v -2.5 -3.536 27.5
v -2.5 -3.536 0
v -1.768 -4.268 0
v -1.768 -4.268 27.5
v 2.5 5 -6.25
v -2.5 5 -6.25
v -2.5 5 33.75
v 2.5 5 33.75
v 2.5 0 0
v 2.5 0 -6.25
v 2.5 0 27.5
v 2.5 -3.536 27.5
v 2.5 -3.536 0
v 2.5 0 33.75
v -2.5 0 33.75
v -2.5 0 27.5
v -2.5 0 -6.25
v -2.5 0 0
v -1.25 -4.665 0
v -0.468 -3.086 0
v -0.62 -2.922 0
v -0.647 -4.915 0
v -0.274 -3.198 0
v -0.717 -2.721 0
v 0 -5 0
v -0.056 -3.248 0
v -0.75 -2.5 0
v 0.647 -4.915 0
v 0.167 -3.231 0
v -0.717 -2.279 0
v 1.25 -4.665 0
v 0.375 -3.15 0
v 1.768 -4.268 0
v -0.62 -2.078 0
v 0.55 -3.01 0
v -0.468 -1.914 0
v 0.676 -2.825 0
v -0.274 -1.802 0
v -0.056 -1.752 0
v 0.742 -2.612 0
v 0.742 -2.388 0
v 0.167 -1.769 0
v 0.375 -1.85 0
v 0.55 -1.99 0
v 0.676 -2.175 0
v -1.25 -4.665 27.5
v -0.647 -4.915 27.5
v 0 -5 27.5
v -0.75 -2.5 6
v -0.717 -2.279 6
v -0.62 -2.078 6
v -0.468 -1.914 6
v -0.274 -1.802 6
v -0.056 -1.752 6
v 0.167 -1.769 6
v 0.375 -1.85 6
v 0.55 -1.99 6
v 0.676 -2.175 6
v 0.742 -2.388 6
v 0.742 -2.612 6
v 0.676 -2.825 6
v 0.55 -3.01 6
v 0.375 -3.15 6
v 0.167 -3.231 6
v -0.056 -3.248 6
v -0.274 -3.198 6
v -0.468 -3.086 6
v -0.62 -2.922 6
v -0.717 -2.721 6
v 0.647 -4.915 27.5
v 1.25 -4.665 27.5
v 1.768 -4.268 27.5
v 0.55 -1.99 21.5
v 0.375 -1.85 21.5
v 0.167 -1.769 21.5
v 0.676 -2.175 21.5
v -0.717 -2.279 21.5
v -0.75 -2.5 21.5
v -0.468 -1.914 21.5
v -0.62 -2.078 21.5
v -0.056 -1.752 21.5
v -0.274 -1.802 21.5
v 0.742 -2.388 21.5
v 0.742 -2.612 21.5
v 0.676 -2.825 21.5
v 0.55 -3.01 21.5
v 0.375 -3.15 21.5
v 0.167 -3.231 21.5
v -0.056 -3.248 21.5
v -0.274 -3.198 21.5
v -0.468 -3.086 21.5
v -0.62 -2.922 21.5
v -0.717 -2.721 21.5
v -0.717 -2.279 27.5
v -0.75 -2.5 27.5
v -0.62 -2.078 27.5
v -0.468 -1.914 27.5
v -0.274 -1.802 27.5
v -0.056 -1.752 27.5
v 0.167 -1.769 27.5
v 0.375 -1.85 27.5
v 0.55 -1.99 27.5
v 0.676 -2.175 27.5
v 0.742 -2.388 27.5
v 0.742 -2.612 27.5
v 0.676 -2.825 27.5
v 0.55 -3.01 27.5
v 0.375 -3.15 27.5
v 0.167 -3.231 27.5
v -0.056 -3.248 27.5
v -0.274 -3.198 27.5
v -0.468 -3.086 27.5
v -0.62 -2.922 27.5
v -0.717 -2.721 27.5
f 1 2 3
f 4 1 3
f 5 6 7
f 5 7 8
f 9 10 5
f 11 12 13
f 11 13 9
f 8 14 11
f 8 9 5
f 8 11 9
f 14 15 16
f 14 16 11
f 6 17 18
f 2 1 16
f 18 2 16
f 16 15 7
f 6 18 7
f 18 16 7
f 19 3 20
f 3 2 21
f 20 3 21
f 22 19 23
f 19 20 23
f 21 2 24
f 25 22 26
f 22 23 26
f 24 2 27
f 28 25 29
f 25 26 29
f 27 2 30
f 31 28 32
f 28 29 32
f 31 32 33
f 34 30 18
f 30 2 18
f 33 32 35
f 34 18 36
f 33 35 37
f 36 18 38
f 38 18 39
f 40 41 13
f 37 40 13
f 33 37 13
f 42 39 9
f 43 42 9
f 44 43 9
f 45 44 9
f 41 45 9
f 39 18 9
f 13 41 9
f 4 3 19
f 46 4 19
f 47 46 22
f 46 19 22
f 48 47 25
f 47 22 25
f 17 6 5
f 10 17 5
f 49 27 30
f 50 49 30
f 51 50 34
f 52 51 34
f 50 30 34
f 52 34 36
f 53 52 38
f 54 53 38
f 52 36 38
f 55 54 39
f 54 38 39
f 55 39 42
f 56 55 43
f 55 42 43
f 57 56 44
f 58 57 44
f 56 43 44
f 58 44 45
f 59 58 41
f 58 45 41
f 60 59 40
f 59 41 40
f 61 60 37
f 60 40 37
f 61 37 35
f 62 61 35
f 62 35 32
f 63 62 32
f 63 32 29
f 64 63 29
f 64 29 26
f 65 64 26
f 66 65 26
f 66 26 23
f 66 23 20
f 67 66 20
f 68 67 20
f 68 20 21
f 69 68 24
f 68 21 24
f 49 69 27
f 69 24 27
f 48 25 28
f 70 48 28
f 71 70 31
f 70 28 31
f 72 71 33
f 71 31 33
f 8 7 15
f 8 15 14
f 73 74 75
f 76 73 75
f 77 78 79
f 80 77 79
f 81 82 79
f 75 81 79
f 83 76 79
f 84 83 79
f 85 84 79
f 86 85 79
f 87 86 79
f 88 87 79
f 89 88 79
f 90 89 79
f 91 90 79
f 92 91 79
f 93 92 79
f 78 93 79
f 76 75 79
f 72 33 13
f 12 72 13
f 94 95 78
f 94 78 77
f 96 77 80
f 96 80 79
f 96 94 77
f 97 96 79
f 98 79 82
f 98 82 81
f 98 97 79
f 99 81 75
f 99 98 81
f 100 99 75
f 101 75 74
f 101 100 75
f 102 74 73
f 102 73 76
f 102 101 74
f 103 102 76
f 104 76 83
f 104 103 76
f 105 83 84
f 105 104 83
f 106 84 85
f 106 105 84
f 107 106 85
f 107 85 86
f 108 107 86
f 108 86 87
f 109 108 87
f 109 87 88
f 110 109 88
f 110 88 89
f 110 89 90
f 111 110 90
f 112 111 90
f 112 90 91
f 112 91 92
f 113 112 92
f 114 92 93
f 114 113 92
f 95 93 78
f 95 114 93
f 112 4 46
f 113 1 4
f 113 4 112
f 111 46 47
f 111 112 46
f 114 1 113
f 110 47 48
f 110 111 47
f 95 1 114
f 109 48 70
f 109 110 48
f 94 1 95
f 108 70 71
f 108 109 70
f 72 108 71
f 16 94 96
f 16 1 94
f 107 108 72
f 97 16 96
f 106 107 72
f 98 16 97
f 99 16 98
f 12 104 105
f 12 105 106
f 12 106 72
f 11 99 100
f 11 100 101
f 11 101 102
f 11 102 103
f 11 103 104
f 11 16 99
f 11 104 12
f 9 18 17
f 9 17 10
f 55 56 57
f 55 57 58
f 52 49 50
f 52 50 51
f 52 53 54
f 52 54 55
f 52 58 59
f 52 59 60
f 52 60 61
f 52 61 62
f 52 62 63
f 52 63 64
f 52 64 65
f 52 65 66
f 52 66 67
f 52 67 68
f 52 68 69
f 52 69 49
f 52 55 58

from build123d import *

# Parameters (mm, degrees)
SKETCH_1_W          = 5
SKETCH_1_H          = 10
EXTRUDE_1_DEPTH     = 27.5
SKETCH_2_W          = 5
SKETCH_2_H          = 5
EXTRUDE_2_DEPTH     = 20
SKETCH_3_R          = 0.75
CUT_EXTRUDE_1_DEPTH = 6
CUT_EXTRUDE_2_DEPTH = 27.5


with BuildPart() as part:
    # 草图1 → 凸台-拉伸1 (new body)
    with BuildSketch(Plane.XY):
        Rectangle(SKETCH_1_W, SKETCH_1_H)
    extrude(amount=EXTRUDE_1_DEPTH)

    # 草图2 → 凸台-拉伸2 (add, symmetric)
    with BuildSketch(Plane.XY.offset(13.75)):
        with Locations((0, 2.5)):
            Rectangle(SKETCH_2_W, SKETCH_2_H)
    extrude(amount=EXTRUDE_2_DEPTH, both=True)

    # 草图3 → 切除-拉伸1 (cut)
    with BuildSketch(Plane(origin=(0, 0, 0), x_dir=(-1, 0, 0), z_dir=(0, 0, -1))):
        with Locations((0, -2.5)):
            Circle(SKETCH_3_R)
    cut_extrude_1 = extrude(amount=-CUT_EXTRUDE_1_DEPTH, mode=Mode.SUBTRACT)

    # 镜向1: 切除-拉伸1 across plane
    add(cut_extrude_1.mirror(Plane.XY.offset(13.75)), mode=Mode.SUBTRACT)

    # 草图4 → 切除-拉伸2 (cut)
    with BuildSketch(Plane(origin=(0, 0, 0), x_dir=(-1, 0, 0), z_dir=(0, 0, -1))):
        with BuildLine():
            ThreePointArc((0, -5), (-0.956708581, -4.809698831), (-1.767766953, -4.267766953))
            Line((-1.767766953, -4.267766953), (-2.5, -3.535533906))
            Line((-2.5, -3.535533906), (-2.5, -5))
            Line((-2.5, -5), (0, -5))
        make_face()
        with BuildLine():
            ThreePointArc((1.767766953, -4.267766953), (0.956708581, -4.809698831), (0, -5))
            Line((0, -5), (2.5, -5))
            Line((2.5, -5), (2.5, -3.535533906))
            Line((2.5, -3.535533906), (1.767766953, -4.267766953))
        make_face()
    extrude(amount=-CUT_EXTRUDE_2_DEPTH, mode=Mode.SUBTRACT)


solid = part.part
